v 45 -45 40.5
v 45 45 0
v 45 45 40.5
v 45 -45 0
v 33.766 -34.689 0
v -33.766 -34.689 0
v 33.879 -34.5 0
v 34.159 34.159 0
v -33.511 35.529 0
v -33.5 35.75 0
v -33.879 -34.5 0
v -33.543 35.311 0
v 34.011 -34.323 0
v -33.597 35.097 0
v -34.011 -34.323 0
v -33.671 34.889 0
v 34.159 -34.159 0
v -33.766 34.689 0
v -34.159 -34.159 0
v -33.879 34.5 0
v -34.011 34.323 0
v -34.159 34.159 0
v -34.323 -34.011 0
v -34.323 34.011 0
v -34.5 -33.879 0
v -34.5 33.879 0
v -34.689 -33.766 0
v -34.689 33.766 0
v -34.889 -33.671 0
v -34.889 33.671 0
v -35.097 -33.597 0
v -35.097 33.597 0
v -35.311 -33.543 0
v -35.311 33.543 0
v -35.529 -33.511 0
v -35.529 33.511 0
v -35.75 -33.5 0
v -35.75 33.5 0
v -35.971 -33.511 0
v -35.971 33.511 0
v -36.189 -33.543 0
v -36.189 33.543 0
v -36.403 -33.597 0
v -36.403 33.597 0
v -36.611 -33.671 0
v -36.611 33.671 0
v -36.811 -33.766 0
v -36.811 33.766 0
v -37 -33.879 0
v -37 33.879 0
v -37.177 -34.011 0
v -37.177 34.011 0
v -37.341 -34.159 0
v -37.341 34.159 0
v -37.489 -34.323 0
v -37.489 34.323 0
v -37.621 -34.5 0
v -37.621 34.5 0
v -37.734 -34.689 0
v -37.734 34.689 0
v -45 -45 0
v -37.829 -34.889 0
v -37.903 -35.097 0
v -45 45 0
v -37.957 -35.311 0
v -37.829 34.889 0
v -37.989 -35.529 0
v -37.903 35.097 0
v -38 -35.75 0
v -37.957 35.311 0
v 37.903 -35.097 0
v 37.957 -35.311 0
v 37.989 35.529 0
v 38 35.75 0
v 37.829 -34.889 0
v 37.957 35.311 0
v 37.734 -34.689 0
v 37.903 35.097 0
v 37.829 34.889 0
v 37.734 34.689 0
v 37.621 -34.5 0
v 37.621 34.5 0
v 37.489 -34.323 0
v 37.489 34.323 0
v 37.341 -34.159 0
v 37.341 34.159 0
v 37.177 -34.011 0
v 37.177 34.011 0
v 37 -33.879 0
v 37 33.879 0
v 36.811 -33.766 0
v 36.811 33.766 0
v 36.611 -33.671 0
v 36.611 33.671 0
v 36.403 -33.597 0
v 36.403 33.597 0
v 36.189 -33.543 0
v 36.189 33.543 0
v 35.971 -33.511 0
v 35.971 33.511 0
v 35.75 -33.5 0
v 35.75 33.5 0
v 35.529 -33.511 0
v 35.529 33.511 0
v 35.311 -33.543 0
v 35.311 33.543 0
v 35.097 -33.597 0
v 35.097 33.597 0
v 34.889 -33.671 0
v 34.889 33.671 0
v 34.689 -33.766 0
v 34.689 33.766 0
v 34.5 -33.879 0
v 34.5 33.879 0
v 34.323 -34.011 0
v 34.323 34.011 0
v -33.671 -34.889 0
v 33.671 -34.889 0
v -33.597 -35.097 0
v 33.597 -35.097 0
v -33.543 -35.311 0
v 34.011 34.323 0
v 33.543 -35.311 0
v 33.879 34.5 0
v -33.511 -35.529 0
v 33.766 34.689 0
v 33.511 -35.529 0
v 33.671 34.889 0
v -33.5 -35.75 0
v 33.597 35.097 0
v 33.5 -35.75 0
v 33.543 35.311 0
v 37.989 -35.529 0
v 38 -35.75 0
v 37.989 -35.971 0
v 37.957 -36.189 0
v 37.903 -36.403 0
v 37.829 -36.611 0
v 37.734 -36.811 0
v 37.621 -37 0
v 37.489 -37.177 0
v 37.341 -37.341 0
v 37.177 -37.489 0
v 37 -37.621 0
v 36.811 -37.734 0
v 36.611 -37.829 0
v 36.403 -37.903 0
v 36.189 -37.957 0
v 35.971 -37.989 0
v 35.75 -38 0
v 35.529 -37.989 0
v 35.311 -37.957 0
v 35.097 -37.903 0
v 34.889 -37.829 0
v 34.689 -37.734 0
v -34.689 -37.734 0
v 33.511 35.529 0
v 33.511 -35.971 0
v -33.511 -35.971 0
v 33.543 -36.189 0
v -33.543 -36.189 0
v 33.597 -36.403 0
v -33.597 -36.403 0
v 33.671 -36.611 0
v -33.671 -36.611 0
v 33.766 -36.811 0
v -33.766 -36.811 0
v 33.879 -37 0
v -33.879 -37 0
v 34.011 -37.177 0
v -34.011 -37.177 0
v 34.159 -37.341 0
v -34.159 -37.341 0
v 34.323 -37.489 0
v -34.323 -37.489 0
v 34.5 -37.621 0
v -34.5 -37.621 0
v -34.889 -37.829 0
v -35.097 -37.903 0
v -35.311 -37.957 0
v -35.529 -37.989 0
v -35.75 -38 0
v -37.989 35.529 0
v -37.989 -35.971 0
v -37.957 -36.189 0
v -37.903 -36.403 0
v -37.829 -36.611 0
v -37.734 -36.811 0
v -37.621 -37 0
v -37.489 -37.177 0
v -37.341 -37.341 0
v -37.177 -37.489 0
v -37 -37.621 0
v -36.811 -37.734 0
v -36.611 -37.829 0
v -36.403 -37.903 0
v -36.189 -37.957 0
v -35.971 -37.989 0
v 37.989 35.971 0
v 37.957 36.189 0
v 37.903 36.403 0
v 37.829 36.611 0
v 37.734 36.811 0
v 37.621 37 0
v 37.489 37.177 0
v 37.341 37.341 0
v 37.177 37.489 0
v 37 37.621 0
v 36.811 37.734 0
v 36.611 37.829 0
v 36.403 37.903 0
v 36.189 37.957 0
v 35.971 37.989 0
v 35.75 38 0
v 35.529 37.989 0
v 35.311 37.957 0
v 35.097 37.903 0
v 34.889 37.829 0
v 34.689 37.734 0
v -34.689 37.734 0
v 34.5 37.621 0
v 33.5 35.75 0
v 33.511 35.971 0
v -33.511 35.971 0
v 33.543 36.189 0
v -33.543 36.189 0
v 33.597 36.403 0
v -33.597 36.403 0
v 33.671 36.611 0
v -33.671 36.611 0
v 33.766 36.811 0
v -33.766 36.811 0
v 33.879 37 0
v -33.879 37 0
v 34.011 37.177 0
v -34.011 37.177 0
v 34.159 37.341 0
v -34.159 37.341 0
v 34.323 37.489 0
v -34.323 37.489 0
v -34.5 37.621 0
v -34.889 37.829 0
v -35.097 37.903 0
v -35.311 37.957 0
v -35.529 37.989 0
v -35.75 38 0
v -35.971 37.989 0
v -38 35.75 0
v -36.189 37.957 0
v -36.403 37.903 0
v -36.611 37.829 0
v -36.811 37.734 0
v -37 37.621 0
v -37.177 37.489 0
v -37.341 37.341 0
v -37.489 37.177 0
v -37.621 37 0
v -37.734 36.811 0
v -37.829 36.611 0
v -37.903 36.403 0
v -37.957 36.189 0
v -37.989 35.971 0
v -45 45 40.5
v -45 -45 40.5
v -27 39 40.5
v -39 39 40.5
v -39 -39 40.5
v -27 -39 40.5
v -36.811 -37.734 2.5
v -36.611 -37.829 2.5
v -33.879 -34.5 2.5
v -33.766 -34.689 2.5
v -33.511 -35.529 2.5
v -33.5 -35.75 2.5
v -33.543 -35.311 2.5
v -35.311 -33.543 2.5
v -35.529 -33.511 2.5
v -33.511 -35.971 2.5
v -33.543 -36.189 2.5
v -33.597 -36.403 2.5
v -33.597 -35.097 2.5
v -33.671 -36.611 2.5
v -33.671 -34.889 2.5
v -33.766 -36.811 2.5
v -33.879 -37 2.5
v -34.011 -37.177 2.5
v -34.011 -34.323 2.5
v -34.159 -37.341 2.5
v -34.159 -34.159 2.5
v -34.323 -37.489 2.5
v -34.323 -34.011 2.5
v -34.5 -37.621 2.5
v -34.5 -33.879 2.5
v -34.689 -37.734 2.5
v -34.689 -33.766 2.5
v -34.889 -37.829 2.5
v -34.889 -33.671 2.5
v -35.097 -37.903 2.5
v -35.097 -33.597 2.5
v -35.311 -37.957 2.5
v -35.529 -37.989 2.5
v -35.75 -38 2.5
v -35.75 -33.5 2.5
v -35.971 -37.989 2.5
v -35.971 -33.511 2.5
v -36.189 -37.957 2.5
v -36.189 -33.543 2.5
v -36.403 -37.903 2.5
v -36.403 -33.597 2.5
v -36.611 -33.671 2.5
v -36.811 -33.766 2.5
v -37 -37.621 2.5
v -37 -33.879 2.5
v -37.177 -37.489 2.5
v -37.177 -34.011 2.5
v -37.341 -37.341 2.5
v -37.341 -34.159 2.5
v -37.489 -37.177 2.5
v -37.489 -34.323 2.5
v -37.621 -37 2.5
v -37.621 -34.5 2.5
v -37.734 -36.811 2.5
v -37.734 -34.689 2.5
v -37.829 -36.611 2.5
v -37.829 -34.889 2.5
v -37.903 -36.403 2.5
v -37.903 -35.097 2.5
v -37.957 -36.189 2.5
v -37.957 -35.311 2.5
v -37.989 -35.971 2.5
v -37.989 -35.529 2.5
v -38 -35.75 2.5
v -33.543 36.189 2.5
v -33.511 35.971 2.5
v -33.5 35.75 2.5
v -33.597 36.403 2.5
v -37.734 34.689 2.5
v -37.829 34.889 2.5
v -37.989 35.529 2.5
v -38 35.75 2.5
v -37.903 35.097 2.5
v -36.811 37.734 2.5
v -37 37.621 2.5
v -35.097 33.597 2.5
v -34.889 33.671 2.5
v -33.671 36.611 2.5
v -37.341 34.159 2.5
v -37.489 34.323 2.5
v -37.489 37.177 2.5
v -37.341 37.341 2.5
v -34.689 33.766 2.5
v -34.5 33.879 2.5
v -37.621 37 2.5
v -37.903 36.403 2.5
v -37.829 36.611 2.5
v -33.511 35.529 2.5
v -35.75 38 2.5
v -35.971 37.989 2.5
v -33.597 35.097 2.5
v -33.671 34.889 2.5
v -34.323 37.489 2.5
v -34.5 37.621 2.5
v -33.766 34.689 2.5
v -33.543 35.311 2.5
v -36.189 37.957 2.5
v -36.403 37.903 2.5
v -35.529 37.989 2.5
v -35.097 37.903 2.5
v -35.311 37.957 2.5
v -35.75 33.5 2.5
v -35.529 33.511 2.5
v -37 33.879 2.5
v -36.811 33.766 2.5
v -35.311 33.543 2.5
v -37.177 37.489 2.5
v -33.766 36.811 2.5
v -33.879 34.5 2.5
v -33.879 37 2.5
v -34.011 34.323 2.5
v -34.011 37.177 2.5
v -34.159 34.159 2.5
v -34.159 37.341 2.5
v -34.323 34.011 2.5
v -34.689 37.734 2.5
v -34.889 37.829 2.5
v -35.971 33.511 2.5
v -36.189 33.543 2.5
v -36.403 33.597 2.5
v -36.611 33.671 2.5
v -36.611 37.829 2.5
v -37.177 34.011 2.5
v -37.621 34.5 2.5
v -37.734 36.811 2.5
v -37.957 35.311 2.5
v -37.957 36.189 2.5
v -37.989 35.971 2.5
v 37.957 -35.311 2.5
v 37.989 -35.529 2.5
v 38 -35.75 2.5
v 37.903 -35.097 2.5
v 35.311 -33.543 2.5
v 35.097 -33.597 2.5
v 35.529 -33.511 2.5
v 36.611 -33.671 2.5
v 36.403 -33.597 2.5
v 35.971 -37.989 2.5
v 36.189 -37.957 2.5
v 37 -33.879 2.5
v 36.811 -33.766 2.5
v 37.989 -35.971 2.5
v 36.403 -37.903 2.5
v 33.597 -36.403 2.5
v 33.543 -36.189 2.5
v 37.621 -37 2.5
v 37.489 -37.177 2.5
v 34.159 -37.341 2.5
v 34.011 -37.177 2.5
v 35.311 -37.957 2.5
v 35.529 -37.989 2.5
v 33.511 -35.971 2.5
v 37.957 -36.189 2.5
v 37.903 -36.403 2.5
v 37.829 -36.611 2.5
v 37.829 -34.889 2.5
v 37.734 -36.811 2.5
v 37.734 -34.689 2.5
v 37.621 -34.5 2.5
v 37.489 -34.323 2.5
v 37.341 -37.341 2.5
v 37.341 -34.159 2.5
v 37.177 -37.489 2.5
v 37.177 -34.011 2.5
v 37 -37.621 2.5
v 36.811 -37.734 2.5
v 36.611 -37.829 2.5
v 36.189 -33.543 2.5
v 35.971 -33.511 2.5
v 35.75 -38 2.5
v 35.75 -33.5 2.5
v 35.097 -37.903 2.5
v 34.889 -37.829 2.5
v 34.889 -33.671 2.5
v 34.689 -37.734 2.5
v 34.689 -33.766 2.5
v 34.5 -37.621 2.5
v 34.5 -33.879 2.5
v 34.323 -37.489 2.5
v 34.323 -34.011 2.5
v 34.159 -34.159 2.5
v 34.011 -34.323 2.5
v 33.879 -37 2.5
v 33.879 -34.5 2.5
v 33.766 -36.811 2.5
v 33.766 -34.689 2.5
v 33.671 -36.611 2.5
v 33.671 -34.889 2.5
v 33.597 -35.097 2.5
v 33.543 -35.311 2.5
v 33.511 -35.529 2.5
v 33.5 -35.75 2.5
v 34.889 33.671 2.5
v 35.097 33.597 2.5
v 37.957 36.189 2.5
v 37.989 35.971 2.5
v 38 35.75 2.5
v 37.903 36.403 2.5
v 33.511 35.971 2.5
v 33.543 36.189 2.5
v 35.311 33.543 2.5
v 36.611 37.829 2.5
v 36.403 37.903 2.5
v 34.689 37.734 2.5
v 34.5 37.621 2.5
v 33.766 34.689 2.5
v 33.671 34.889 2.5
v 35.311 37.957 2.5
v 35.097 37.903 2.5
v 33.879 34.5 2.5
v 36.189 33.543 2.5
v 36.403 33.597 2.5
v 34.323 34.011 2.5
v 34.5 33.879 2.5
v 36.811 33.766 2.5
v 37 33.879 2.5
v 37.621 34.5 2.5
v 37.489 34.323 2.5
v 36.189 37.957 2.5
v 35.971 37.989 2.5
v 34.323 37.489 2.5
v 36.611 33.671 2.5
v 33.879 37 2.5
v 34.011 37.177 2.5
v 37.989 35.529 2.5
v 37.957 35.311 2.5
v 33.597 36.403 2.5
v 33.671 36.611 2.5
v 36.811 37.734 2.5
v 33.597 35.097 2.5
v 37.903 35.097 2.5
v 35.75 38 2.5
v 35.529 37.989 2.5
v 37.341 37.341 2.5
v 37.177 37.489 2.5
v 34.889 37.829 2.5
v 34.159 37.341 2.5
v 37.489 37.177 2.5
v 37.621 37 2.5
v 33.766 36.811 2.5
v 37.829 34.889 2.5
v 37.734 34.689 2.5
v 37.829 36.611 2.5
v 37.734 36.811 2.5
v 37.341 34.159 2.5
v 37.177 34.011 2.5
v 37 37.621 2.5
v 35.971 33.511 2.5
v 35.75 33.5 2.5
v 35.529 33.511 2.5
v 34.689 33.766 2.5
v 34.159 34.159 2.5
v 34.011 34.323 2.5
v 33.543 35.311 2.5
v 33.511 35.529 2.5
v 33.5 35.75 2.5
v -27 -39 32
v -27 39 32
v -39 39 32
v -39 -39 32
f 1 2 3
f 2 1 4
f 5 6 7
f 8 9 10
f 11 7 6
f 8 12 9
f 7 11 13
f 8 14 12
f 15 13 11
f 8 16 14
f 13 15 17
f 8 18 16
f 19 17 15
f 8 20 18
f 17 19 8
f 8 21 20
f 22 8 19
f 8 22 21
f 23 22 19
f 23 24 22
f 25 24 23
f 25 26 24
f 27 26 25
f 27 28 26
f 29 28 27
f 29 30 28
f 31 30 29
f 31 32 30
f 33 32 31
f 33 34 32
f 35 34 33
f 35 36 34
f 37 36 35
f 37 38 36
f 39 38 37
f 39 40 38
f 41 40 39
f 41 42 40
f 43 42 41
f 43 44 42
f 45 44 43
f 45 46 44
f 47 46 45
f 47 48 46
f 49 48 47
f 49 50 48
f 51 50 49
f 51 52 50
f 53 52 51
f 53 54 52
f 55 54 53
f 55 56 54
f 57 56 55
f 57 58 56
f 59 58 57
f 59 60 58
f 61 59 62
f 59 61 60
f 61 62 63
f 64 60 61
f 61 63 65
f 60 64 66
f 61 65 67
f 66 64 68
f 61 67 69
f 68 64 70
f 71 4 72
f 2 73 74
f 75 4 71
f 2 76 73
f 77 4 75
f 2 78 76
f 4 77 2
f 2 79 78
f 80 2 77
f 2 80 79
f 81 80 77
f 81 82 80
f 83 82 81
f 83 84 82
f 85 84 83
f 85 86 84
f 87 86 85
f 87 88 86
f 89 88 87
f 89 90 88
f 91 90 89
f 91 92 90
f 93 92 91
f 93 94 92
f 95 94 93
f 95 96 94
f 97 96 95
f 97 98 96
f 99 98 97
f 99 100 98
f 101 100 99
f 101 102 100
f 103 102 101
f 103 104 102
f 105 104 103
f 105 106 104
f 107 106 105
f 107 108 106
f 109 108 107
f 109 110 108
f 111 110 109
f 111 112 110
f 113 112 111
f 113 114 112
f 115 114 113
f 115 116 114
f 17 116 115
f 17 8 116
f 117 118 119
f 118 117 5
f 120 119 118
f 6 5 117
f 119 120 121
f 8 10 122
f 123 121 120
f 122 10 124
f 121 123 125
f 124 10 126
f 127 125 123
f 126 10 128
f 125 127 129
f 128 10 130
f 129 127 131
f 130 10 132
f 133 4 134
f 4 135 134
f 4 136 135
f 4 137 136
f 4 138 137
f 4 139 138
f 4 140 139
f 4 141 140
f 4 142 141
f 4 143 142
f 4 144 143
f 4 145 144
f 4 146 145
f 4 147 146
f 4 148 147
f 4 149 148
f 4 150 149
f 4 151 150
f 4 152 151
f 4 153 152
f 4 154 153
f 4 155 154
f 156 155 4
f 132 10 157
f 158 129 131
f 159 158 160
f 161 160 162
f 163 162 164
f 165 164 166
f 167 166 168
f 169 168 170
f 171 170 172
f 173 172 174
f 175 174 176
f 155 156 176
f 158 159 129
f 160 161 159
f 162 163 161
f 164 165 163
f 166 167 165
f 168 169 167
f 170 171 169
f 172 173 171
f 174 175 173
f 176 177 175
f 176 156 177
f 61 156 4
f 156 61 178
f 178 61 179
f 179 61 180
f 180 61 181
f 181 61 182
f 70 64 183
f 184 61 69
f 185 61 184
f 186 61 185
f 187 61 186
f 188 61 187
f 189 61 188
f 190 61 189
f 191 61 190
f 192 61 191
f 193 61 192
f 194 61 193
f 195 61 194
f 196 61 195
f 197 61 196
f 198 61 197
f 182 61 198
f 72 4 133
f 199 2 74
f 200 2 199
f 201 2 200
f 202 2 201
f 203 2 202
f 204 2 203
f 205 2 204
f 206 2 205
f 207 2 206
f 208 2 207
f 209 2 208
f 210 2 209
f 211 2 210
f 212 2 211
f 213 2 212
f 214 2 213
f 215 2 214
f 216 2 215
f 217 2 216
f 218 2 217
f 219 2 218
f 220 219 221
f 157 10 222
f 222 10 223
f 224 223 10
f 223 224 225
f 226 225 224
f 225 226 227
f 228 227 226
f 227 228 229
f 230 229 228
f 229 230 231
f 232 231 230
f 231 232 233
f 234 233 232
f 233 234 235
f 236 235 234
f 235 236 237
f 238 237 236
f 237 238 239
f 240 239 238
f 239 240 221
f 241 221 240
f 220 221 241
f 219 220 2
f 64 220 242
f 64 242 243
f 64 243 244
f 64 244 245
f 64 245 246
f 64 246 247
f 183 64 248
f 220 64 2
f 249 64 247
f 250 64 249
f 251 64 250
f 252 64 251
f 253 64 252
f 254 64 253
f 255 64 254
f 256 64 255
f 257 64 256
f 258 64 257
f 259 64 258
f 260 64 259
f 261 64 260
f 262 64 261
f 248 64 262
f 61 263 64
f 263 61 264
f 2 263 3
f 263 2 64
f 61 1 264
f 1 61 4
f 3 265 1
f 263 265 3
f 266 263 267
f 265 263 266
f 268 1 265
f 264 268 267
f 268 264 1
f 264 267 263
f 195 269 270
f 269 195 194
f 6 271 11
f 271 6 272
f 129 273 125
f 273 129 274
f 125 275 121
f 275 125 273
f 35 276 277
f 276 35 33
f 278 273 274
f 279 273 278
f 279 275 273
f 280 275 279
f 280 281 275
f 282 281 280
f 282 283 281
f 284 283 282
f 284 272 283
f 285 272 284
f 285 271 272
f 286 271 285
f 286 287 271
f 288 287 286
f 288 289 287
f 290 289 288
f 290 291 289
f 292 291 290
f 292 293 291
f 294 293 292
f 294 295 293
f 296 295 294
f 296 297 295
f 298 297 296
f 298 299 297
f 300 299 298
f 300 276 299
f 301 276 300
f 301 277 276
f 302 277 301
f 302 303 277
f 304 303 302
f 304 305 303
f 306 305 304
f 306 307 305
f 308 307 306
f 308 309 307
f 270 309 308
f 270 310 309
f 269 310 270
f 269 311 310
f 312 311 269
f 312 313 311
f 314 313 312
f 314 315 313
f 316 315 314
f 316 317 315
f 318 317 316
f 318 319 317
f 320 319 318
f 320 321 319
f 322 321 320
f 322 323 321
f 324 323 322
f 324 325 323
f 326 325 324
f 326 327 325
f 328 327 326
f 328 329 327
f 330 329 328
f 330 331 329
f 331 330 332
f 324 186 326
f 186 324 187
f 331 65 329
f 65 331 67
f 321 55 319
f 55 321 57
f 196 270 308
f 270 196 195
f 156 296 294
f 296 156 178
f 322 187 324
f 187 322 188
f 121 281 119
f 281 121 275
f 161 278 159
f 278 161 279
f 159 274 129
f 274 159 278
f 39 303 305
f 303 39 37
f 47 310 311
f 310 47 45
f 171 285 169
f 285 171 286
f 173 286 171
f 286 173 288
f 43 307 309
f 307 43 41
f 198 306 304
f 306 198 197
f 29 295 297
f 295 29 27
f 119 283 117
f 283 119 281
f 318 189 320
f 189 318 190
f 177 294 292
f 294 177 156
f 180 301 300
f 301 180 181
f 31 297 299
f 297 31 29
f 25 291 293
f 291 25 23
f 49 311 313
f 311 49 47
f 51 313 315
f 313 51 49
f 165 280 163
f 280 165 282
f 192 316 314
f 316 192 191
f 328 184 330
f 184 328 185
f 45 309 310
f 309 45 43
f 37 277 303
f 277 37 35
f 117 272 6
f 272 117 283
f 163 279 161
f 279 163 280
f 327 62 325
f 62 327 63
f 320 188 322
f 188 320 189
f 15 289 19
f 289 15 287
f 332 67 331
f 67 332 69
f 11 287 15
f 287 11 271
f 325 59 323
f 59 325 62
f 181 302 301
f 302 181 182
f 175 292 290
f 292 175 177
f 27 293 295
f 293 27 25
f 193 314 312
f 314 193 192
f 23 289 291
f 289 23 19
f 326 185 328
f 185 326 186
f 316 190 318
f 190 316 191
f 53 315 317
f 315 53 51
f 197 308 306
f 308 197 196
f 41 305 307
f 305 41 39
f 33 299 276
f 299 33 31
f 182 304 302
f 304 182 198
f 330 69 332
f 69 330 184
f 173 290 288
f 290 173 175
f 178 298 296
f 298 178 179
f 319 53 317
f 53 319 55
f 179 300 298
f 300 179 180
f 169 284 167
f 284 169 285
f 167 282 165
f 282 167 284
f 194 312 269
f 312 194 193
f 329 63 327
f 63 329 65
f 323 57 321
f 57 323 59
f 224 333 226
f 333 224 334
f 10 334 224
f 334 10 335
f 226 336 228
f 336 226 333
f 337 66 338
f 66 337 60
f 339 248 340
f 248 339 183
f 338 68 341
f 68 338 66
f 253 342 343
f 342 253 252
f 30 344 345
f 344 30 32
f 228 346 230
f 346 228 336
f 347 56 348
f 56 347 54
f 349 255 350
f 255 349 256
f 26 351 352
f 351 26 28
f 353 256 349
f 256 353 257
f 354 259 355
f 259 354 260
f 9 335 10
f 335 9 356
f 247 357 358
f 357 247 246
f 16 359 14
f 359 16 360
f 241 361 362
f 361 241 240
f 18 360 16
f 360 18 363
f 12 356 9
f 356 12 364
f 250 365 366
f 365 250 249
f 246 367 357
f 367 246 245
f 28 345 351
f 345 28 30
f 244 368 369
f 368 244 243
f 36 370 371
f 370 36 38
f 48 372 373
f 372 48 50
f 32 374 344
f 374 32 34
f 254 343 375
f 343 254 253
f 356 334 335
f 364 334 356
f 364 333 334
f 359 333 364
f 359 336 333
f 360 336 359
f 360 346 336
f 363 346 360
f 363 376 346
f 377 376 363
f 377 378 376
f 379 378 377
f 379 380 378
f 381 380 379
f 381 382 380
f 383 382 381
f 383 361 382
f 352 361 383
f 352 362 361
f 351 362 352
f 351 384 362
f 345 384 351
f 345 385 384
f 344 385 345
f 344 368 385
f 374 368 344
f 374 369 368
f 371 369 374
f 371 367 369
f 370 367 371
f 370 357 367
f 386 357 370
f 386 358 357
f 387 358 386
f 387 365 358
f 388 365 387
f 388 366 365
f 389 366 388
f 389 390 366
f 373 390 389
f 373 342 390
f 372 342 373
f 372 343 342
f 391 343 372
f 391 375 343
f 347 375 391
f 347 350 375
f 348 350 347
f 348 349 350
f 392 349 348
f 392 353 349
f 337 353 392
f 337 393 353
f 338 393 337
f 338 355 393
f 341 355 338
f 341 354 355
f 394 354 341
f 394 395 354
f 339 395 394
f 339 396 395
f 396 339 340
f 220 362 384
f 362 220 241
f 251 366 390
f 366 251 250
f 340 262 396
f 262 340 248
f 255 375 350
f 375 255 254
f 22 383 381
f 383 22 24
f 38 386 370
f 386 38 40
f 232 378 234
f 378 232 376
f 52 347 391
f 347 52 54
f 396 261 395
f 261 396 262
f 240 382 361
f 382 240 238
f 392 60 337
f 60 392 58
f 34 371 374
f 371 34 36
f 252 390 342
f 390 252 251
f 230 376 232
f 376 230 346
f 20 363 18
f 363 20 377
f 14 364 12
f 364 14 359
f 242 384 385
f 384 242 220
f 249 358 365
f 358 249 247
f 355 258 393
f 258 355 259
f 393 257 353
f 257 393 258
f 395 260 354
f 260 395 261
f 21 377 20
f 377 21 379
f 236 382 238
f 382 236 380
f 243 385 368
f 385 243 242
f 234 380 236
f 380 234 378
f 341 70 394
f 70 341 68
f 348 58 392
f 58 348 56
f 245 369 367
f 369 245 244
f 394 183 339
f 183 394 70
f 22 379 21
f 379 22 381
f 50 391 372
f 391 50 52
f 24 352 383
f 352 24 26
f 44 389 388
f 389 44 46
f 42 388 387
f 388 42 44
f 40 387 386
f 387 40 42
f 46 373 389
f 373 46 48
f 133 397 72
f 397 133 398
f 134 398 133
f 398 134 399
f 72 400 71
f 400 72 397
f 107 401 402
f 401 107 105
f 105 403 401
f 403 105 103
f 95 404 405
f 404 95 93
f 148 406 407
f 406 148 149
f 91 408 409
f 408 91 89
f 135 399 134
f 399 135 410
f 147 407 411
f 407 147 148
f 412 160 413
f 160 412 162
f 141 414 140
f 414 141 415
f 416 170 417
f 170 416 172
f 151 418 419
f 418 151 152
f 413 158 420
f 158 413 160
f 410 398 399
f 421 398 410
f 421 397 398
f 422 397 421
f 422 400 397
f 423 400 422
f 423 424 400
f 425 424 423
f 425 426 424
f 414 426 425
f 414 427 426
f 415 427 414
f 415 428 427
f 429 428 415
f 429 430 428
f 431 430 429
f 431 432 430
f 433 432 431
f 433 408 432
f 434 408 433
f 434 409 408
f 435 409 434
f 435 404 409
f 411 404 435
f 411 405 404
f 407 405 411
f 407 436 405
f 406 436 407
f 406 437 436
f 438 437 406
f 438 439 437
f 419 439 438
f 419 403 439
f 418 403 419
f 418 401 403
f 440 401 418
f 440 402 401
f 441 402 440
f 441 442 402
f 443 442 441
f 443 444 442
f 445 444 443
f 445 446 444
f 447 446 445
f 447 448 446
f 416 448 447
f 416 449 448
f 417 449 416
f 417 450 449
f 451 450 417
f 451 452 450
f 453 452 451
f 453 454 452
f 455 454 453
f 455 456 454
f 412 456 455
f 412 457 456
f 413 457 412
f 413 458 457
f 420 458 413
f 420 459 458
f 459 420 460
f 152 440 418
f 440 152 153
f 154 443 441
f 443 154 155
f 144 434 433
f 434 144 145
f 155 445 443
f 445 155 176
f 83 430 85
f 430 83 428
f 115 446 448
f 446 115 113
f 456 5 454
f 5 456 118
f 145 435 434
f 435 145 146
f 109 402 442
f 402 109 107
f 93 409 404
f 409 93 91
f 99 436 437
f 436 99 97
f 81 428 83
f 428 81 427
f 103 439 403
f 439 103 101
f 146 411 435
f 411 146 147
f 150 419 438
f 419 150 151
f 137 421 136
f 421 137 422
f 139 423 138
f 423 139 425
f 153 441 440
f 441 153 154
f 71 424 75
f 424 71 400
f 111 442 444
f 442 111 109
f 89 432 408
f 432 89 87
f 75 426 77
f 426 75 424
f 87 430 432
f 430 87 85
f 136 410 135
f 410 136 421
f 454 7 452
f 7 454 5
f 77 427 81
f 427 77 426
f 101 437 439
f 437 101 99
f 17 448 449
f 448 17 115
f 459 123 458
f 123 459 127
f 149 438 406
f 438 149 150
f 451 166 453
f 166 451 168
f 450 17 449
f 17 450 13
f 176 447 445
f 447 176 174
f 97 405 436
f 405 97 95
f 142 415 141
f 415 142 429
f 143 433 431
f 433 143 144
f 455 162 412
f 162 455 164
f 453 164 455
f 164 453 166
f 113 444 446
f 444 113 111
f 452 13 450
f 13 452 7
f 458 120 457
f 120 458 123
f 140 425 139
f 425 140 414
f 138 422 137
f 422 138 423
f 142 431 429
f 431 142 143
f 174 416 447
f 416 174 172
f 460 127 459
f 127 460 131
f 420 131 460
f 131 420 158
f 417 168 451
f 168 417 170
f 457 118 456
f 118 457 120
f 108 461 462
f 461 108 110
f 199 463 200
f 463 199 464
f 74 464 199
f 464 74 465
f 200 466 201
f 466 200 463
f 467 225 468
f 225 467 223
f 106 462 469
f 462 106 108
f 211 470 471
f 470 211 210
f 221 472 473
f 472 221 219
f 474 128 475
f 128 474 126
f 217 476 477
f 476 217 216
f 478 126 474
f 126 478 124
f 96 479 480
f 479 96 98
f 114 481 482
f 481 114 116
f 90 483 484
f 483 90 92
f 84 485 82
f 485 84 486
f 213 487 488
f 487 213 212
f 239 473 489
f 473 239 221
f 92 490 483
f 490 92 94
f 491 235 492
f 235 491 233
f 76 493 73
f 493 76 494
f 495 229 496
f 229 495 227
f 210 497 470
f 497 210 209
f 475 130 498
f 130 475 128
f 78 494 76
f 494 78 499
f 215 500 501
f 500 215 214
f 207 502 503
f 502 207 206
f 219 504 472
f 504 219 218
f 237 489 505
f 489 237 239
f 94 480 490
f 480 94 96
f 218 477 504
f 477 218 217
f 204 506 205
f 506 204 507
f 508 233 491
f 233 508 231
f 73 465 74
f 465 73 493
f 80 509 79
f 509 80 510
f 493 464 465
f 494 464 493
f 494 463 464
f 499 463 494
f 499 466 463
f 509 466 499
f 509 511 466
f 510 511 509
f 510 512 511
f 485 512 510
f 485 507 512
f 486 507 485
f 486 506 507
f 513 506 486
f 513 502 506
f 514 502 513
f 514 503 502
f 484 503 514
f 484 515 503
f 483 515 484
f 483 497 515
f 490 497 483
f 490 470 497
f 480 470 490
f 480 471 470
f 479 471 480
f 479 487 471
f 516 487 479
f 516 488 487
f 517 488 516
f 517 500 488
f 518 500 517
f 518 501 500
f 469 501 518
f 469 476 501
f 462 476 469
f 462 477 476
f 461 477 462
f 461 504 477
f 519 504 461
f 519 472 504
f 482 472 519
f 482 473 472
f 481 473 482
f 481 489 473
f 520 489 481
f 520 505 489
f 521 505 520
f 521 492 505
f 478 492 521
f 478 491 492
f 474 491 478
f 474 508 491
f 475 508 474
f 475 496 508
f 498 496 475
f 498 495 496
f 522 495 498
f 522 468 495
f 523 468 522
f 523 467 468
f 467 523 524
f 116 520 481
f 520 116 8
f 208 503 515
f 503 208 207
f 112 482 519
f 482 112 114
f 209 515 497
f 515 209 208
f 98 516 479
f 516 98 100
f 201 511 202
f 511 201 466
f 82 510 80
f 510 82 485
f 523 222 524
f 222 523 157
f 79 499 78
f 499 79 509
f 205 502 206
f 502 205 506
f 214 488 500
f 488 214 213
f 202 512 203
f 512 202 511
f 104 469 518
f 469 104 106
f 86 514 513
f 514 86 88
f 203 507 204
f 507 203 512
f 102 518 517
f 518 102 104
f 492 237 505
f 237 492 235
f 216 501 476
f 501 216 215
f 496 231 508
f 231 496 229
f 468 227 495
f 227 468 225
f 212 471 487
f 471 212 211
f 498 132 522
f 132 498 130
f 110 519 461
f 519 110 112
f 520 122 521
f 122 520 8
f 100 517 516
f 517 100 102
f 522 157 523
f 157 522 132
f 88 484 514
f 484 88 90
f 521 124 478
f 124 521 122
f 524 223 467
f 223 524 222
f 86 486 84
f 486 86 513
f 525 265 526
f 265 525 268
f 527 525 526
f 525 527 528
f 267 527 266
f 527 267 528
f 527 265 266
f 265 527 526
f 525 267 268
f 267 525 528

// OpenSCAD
// DIY magnetic stirrer housing (print orientation: upside-down open box)
// Units: mm. Walls 2.5 mm thick. Top plate 2 mm thick.

// ---- Dimensions ----
box_outer_x   = 90;    // outer size in X
box_outer_y   = 90;    // outer size in Y
wall_thick    = 2.5;   // wall thickness
top_plate_t   = 2;     // top plate thickness (z = 0 to 2)
box_height    = 40;    // total height of box walls (z = 0 to 40)
screw_hole_d  = 4.5;   // M4 screw hole diameter
screw_pitch   = 71.5;  // square pitch of screw holes (X and Y)
notch_w       = 12;    // power cable notch width
notch_depth   = 8;     // notch depth from open edge (z = 32 to 40)
eps           = 0.5;   // cutter overshoot past faces

$fn = 64;

// ---- Model ----
difference() {
    // Main box body: floor + four walls, open at the top
    union() {
        translate([-box_outer_x/2, -box_outer_y/2, 0])
            cube([box_outer_x, box_outer_y, box_height]);

        // Open the top: cut a block 1 mm above the top plate through the walls
        translate([-box_outer_x/2, -box_outer_y/2, box_height - top_plate_t - eps])
            cube([box_outer_x, box_outer_y, top_plate_t + 2*eps]);
    }

    // Screw holes through the top plate on a centred square pattern
    for (sx = [-1, 1], sy = [-1, 1])
        translate([sx * screw_pitch/2, sy * screw_pitch/2, 0])
            cylinder(d = screw_hole_d, h = top_plate_t + eps);

    // Notch for the power cable in one wall, centred along that wall
    translate([-box_outer_x/2 + notch_w/2, -box_outer_y/2 + notch_w/2,
               box_height - notch_depth])
        cube([notch_w, box_outer_y - notch_w, notch_depth + eps]);
}
